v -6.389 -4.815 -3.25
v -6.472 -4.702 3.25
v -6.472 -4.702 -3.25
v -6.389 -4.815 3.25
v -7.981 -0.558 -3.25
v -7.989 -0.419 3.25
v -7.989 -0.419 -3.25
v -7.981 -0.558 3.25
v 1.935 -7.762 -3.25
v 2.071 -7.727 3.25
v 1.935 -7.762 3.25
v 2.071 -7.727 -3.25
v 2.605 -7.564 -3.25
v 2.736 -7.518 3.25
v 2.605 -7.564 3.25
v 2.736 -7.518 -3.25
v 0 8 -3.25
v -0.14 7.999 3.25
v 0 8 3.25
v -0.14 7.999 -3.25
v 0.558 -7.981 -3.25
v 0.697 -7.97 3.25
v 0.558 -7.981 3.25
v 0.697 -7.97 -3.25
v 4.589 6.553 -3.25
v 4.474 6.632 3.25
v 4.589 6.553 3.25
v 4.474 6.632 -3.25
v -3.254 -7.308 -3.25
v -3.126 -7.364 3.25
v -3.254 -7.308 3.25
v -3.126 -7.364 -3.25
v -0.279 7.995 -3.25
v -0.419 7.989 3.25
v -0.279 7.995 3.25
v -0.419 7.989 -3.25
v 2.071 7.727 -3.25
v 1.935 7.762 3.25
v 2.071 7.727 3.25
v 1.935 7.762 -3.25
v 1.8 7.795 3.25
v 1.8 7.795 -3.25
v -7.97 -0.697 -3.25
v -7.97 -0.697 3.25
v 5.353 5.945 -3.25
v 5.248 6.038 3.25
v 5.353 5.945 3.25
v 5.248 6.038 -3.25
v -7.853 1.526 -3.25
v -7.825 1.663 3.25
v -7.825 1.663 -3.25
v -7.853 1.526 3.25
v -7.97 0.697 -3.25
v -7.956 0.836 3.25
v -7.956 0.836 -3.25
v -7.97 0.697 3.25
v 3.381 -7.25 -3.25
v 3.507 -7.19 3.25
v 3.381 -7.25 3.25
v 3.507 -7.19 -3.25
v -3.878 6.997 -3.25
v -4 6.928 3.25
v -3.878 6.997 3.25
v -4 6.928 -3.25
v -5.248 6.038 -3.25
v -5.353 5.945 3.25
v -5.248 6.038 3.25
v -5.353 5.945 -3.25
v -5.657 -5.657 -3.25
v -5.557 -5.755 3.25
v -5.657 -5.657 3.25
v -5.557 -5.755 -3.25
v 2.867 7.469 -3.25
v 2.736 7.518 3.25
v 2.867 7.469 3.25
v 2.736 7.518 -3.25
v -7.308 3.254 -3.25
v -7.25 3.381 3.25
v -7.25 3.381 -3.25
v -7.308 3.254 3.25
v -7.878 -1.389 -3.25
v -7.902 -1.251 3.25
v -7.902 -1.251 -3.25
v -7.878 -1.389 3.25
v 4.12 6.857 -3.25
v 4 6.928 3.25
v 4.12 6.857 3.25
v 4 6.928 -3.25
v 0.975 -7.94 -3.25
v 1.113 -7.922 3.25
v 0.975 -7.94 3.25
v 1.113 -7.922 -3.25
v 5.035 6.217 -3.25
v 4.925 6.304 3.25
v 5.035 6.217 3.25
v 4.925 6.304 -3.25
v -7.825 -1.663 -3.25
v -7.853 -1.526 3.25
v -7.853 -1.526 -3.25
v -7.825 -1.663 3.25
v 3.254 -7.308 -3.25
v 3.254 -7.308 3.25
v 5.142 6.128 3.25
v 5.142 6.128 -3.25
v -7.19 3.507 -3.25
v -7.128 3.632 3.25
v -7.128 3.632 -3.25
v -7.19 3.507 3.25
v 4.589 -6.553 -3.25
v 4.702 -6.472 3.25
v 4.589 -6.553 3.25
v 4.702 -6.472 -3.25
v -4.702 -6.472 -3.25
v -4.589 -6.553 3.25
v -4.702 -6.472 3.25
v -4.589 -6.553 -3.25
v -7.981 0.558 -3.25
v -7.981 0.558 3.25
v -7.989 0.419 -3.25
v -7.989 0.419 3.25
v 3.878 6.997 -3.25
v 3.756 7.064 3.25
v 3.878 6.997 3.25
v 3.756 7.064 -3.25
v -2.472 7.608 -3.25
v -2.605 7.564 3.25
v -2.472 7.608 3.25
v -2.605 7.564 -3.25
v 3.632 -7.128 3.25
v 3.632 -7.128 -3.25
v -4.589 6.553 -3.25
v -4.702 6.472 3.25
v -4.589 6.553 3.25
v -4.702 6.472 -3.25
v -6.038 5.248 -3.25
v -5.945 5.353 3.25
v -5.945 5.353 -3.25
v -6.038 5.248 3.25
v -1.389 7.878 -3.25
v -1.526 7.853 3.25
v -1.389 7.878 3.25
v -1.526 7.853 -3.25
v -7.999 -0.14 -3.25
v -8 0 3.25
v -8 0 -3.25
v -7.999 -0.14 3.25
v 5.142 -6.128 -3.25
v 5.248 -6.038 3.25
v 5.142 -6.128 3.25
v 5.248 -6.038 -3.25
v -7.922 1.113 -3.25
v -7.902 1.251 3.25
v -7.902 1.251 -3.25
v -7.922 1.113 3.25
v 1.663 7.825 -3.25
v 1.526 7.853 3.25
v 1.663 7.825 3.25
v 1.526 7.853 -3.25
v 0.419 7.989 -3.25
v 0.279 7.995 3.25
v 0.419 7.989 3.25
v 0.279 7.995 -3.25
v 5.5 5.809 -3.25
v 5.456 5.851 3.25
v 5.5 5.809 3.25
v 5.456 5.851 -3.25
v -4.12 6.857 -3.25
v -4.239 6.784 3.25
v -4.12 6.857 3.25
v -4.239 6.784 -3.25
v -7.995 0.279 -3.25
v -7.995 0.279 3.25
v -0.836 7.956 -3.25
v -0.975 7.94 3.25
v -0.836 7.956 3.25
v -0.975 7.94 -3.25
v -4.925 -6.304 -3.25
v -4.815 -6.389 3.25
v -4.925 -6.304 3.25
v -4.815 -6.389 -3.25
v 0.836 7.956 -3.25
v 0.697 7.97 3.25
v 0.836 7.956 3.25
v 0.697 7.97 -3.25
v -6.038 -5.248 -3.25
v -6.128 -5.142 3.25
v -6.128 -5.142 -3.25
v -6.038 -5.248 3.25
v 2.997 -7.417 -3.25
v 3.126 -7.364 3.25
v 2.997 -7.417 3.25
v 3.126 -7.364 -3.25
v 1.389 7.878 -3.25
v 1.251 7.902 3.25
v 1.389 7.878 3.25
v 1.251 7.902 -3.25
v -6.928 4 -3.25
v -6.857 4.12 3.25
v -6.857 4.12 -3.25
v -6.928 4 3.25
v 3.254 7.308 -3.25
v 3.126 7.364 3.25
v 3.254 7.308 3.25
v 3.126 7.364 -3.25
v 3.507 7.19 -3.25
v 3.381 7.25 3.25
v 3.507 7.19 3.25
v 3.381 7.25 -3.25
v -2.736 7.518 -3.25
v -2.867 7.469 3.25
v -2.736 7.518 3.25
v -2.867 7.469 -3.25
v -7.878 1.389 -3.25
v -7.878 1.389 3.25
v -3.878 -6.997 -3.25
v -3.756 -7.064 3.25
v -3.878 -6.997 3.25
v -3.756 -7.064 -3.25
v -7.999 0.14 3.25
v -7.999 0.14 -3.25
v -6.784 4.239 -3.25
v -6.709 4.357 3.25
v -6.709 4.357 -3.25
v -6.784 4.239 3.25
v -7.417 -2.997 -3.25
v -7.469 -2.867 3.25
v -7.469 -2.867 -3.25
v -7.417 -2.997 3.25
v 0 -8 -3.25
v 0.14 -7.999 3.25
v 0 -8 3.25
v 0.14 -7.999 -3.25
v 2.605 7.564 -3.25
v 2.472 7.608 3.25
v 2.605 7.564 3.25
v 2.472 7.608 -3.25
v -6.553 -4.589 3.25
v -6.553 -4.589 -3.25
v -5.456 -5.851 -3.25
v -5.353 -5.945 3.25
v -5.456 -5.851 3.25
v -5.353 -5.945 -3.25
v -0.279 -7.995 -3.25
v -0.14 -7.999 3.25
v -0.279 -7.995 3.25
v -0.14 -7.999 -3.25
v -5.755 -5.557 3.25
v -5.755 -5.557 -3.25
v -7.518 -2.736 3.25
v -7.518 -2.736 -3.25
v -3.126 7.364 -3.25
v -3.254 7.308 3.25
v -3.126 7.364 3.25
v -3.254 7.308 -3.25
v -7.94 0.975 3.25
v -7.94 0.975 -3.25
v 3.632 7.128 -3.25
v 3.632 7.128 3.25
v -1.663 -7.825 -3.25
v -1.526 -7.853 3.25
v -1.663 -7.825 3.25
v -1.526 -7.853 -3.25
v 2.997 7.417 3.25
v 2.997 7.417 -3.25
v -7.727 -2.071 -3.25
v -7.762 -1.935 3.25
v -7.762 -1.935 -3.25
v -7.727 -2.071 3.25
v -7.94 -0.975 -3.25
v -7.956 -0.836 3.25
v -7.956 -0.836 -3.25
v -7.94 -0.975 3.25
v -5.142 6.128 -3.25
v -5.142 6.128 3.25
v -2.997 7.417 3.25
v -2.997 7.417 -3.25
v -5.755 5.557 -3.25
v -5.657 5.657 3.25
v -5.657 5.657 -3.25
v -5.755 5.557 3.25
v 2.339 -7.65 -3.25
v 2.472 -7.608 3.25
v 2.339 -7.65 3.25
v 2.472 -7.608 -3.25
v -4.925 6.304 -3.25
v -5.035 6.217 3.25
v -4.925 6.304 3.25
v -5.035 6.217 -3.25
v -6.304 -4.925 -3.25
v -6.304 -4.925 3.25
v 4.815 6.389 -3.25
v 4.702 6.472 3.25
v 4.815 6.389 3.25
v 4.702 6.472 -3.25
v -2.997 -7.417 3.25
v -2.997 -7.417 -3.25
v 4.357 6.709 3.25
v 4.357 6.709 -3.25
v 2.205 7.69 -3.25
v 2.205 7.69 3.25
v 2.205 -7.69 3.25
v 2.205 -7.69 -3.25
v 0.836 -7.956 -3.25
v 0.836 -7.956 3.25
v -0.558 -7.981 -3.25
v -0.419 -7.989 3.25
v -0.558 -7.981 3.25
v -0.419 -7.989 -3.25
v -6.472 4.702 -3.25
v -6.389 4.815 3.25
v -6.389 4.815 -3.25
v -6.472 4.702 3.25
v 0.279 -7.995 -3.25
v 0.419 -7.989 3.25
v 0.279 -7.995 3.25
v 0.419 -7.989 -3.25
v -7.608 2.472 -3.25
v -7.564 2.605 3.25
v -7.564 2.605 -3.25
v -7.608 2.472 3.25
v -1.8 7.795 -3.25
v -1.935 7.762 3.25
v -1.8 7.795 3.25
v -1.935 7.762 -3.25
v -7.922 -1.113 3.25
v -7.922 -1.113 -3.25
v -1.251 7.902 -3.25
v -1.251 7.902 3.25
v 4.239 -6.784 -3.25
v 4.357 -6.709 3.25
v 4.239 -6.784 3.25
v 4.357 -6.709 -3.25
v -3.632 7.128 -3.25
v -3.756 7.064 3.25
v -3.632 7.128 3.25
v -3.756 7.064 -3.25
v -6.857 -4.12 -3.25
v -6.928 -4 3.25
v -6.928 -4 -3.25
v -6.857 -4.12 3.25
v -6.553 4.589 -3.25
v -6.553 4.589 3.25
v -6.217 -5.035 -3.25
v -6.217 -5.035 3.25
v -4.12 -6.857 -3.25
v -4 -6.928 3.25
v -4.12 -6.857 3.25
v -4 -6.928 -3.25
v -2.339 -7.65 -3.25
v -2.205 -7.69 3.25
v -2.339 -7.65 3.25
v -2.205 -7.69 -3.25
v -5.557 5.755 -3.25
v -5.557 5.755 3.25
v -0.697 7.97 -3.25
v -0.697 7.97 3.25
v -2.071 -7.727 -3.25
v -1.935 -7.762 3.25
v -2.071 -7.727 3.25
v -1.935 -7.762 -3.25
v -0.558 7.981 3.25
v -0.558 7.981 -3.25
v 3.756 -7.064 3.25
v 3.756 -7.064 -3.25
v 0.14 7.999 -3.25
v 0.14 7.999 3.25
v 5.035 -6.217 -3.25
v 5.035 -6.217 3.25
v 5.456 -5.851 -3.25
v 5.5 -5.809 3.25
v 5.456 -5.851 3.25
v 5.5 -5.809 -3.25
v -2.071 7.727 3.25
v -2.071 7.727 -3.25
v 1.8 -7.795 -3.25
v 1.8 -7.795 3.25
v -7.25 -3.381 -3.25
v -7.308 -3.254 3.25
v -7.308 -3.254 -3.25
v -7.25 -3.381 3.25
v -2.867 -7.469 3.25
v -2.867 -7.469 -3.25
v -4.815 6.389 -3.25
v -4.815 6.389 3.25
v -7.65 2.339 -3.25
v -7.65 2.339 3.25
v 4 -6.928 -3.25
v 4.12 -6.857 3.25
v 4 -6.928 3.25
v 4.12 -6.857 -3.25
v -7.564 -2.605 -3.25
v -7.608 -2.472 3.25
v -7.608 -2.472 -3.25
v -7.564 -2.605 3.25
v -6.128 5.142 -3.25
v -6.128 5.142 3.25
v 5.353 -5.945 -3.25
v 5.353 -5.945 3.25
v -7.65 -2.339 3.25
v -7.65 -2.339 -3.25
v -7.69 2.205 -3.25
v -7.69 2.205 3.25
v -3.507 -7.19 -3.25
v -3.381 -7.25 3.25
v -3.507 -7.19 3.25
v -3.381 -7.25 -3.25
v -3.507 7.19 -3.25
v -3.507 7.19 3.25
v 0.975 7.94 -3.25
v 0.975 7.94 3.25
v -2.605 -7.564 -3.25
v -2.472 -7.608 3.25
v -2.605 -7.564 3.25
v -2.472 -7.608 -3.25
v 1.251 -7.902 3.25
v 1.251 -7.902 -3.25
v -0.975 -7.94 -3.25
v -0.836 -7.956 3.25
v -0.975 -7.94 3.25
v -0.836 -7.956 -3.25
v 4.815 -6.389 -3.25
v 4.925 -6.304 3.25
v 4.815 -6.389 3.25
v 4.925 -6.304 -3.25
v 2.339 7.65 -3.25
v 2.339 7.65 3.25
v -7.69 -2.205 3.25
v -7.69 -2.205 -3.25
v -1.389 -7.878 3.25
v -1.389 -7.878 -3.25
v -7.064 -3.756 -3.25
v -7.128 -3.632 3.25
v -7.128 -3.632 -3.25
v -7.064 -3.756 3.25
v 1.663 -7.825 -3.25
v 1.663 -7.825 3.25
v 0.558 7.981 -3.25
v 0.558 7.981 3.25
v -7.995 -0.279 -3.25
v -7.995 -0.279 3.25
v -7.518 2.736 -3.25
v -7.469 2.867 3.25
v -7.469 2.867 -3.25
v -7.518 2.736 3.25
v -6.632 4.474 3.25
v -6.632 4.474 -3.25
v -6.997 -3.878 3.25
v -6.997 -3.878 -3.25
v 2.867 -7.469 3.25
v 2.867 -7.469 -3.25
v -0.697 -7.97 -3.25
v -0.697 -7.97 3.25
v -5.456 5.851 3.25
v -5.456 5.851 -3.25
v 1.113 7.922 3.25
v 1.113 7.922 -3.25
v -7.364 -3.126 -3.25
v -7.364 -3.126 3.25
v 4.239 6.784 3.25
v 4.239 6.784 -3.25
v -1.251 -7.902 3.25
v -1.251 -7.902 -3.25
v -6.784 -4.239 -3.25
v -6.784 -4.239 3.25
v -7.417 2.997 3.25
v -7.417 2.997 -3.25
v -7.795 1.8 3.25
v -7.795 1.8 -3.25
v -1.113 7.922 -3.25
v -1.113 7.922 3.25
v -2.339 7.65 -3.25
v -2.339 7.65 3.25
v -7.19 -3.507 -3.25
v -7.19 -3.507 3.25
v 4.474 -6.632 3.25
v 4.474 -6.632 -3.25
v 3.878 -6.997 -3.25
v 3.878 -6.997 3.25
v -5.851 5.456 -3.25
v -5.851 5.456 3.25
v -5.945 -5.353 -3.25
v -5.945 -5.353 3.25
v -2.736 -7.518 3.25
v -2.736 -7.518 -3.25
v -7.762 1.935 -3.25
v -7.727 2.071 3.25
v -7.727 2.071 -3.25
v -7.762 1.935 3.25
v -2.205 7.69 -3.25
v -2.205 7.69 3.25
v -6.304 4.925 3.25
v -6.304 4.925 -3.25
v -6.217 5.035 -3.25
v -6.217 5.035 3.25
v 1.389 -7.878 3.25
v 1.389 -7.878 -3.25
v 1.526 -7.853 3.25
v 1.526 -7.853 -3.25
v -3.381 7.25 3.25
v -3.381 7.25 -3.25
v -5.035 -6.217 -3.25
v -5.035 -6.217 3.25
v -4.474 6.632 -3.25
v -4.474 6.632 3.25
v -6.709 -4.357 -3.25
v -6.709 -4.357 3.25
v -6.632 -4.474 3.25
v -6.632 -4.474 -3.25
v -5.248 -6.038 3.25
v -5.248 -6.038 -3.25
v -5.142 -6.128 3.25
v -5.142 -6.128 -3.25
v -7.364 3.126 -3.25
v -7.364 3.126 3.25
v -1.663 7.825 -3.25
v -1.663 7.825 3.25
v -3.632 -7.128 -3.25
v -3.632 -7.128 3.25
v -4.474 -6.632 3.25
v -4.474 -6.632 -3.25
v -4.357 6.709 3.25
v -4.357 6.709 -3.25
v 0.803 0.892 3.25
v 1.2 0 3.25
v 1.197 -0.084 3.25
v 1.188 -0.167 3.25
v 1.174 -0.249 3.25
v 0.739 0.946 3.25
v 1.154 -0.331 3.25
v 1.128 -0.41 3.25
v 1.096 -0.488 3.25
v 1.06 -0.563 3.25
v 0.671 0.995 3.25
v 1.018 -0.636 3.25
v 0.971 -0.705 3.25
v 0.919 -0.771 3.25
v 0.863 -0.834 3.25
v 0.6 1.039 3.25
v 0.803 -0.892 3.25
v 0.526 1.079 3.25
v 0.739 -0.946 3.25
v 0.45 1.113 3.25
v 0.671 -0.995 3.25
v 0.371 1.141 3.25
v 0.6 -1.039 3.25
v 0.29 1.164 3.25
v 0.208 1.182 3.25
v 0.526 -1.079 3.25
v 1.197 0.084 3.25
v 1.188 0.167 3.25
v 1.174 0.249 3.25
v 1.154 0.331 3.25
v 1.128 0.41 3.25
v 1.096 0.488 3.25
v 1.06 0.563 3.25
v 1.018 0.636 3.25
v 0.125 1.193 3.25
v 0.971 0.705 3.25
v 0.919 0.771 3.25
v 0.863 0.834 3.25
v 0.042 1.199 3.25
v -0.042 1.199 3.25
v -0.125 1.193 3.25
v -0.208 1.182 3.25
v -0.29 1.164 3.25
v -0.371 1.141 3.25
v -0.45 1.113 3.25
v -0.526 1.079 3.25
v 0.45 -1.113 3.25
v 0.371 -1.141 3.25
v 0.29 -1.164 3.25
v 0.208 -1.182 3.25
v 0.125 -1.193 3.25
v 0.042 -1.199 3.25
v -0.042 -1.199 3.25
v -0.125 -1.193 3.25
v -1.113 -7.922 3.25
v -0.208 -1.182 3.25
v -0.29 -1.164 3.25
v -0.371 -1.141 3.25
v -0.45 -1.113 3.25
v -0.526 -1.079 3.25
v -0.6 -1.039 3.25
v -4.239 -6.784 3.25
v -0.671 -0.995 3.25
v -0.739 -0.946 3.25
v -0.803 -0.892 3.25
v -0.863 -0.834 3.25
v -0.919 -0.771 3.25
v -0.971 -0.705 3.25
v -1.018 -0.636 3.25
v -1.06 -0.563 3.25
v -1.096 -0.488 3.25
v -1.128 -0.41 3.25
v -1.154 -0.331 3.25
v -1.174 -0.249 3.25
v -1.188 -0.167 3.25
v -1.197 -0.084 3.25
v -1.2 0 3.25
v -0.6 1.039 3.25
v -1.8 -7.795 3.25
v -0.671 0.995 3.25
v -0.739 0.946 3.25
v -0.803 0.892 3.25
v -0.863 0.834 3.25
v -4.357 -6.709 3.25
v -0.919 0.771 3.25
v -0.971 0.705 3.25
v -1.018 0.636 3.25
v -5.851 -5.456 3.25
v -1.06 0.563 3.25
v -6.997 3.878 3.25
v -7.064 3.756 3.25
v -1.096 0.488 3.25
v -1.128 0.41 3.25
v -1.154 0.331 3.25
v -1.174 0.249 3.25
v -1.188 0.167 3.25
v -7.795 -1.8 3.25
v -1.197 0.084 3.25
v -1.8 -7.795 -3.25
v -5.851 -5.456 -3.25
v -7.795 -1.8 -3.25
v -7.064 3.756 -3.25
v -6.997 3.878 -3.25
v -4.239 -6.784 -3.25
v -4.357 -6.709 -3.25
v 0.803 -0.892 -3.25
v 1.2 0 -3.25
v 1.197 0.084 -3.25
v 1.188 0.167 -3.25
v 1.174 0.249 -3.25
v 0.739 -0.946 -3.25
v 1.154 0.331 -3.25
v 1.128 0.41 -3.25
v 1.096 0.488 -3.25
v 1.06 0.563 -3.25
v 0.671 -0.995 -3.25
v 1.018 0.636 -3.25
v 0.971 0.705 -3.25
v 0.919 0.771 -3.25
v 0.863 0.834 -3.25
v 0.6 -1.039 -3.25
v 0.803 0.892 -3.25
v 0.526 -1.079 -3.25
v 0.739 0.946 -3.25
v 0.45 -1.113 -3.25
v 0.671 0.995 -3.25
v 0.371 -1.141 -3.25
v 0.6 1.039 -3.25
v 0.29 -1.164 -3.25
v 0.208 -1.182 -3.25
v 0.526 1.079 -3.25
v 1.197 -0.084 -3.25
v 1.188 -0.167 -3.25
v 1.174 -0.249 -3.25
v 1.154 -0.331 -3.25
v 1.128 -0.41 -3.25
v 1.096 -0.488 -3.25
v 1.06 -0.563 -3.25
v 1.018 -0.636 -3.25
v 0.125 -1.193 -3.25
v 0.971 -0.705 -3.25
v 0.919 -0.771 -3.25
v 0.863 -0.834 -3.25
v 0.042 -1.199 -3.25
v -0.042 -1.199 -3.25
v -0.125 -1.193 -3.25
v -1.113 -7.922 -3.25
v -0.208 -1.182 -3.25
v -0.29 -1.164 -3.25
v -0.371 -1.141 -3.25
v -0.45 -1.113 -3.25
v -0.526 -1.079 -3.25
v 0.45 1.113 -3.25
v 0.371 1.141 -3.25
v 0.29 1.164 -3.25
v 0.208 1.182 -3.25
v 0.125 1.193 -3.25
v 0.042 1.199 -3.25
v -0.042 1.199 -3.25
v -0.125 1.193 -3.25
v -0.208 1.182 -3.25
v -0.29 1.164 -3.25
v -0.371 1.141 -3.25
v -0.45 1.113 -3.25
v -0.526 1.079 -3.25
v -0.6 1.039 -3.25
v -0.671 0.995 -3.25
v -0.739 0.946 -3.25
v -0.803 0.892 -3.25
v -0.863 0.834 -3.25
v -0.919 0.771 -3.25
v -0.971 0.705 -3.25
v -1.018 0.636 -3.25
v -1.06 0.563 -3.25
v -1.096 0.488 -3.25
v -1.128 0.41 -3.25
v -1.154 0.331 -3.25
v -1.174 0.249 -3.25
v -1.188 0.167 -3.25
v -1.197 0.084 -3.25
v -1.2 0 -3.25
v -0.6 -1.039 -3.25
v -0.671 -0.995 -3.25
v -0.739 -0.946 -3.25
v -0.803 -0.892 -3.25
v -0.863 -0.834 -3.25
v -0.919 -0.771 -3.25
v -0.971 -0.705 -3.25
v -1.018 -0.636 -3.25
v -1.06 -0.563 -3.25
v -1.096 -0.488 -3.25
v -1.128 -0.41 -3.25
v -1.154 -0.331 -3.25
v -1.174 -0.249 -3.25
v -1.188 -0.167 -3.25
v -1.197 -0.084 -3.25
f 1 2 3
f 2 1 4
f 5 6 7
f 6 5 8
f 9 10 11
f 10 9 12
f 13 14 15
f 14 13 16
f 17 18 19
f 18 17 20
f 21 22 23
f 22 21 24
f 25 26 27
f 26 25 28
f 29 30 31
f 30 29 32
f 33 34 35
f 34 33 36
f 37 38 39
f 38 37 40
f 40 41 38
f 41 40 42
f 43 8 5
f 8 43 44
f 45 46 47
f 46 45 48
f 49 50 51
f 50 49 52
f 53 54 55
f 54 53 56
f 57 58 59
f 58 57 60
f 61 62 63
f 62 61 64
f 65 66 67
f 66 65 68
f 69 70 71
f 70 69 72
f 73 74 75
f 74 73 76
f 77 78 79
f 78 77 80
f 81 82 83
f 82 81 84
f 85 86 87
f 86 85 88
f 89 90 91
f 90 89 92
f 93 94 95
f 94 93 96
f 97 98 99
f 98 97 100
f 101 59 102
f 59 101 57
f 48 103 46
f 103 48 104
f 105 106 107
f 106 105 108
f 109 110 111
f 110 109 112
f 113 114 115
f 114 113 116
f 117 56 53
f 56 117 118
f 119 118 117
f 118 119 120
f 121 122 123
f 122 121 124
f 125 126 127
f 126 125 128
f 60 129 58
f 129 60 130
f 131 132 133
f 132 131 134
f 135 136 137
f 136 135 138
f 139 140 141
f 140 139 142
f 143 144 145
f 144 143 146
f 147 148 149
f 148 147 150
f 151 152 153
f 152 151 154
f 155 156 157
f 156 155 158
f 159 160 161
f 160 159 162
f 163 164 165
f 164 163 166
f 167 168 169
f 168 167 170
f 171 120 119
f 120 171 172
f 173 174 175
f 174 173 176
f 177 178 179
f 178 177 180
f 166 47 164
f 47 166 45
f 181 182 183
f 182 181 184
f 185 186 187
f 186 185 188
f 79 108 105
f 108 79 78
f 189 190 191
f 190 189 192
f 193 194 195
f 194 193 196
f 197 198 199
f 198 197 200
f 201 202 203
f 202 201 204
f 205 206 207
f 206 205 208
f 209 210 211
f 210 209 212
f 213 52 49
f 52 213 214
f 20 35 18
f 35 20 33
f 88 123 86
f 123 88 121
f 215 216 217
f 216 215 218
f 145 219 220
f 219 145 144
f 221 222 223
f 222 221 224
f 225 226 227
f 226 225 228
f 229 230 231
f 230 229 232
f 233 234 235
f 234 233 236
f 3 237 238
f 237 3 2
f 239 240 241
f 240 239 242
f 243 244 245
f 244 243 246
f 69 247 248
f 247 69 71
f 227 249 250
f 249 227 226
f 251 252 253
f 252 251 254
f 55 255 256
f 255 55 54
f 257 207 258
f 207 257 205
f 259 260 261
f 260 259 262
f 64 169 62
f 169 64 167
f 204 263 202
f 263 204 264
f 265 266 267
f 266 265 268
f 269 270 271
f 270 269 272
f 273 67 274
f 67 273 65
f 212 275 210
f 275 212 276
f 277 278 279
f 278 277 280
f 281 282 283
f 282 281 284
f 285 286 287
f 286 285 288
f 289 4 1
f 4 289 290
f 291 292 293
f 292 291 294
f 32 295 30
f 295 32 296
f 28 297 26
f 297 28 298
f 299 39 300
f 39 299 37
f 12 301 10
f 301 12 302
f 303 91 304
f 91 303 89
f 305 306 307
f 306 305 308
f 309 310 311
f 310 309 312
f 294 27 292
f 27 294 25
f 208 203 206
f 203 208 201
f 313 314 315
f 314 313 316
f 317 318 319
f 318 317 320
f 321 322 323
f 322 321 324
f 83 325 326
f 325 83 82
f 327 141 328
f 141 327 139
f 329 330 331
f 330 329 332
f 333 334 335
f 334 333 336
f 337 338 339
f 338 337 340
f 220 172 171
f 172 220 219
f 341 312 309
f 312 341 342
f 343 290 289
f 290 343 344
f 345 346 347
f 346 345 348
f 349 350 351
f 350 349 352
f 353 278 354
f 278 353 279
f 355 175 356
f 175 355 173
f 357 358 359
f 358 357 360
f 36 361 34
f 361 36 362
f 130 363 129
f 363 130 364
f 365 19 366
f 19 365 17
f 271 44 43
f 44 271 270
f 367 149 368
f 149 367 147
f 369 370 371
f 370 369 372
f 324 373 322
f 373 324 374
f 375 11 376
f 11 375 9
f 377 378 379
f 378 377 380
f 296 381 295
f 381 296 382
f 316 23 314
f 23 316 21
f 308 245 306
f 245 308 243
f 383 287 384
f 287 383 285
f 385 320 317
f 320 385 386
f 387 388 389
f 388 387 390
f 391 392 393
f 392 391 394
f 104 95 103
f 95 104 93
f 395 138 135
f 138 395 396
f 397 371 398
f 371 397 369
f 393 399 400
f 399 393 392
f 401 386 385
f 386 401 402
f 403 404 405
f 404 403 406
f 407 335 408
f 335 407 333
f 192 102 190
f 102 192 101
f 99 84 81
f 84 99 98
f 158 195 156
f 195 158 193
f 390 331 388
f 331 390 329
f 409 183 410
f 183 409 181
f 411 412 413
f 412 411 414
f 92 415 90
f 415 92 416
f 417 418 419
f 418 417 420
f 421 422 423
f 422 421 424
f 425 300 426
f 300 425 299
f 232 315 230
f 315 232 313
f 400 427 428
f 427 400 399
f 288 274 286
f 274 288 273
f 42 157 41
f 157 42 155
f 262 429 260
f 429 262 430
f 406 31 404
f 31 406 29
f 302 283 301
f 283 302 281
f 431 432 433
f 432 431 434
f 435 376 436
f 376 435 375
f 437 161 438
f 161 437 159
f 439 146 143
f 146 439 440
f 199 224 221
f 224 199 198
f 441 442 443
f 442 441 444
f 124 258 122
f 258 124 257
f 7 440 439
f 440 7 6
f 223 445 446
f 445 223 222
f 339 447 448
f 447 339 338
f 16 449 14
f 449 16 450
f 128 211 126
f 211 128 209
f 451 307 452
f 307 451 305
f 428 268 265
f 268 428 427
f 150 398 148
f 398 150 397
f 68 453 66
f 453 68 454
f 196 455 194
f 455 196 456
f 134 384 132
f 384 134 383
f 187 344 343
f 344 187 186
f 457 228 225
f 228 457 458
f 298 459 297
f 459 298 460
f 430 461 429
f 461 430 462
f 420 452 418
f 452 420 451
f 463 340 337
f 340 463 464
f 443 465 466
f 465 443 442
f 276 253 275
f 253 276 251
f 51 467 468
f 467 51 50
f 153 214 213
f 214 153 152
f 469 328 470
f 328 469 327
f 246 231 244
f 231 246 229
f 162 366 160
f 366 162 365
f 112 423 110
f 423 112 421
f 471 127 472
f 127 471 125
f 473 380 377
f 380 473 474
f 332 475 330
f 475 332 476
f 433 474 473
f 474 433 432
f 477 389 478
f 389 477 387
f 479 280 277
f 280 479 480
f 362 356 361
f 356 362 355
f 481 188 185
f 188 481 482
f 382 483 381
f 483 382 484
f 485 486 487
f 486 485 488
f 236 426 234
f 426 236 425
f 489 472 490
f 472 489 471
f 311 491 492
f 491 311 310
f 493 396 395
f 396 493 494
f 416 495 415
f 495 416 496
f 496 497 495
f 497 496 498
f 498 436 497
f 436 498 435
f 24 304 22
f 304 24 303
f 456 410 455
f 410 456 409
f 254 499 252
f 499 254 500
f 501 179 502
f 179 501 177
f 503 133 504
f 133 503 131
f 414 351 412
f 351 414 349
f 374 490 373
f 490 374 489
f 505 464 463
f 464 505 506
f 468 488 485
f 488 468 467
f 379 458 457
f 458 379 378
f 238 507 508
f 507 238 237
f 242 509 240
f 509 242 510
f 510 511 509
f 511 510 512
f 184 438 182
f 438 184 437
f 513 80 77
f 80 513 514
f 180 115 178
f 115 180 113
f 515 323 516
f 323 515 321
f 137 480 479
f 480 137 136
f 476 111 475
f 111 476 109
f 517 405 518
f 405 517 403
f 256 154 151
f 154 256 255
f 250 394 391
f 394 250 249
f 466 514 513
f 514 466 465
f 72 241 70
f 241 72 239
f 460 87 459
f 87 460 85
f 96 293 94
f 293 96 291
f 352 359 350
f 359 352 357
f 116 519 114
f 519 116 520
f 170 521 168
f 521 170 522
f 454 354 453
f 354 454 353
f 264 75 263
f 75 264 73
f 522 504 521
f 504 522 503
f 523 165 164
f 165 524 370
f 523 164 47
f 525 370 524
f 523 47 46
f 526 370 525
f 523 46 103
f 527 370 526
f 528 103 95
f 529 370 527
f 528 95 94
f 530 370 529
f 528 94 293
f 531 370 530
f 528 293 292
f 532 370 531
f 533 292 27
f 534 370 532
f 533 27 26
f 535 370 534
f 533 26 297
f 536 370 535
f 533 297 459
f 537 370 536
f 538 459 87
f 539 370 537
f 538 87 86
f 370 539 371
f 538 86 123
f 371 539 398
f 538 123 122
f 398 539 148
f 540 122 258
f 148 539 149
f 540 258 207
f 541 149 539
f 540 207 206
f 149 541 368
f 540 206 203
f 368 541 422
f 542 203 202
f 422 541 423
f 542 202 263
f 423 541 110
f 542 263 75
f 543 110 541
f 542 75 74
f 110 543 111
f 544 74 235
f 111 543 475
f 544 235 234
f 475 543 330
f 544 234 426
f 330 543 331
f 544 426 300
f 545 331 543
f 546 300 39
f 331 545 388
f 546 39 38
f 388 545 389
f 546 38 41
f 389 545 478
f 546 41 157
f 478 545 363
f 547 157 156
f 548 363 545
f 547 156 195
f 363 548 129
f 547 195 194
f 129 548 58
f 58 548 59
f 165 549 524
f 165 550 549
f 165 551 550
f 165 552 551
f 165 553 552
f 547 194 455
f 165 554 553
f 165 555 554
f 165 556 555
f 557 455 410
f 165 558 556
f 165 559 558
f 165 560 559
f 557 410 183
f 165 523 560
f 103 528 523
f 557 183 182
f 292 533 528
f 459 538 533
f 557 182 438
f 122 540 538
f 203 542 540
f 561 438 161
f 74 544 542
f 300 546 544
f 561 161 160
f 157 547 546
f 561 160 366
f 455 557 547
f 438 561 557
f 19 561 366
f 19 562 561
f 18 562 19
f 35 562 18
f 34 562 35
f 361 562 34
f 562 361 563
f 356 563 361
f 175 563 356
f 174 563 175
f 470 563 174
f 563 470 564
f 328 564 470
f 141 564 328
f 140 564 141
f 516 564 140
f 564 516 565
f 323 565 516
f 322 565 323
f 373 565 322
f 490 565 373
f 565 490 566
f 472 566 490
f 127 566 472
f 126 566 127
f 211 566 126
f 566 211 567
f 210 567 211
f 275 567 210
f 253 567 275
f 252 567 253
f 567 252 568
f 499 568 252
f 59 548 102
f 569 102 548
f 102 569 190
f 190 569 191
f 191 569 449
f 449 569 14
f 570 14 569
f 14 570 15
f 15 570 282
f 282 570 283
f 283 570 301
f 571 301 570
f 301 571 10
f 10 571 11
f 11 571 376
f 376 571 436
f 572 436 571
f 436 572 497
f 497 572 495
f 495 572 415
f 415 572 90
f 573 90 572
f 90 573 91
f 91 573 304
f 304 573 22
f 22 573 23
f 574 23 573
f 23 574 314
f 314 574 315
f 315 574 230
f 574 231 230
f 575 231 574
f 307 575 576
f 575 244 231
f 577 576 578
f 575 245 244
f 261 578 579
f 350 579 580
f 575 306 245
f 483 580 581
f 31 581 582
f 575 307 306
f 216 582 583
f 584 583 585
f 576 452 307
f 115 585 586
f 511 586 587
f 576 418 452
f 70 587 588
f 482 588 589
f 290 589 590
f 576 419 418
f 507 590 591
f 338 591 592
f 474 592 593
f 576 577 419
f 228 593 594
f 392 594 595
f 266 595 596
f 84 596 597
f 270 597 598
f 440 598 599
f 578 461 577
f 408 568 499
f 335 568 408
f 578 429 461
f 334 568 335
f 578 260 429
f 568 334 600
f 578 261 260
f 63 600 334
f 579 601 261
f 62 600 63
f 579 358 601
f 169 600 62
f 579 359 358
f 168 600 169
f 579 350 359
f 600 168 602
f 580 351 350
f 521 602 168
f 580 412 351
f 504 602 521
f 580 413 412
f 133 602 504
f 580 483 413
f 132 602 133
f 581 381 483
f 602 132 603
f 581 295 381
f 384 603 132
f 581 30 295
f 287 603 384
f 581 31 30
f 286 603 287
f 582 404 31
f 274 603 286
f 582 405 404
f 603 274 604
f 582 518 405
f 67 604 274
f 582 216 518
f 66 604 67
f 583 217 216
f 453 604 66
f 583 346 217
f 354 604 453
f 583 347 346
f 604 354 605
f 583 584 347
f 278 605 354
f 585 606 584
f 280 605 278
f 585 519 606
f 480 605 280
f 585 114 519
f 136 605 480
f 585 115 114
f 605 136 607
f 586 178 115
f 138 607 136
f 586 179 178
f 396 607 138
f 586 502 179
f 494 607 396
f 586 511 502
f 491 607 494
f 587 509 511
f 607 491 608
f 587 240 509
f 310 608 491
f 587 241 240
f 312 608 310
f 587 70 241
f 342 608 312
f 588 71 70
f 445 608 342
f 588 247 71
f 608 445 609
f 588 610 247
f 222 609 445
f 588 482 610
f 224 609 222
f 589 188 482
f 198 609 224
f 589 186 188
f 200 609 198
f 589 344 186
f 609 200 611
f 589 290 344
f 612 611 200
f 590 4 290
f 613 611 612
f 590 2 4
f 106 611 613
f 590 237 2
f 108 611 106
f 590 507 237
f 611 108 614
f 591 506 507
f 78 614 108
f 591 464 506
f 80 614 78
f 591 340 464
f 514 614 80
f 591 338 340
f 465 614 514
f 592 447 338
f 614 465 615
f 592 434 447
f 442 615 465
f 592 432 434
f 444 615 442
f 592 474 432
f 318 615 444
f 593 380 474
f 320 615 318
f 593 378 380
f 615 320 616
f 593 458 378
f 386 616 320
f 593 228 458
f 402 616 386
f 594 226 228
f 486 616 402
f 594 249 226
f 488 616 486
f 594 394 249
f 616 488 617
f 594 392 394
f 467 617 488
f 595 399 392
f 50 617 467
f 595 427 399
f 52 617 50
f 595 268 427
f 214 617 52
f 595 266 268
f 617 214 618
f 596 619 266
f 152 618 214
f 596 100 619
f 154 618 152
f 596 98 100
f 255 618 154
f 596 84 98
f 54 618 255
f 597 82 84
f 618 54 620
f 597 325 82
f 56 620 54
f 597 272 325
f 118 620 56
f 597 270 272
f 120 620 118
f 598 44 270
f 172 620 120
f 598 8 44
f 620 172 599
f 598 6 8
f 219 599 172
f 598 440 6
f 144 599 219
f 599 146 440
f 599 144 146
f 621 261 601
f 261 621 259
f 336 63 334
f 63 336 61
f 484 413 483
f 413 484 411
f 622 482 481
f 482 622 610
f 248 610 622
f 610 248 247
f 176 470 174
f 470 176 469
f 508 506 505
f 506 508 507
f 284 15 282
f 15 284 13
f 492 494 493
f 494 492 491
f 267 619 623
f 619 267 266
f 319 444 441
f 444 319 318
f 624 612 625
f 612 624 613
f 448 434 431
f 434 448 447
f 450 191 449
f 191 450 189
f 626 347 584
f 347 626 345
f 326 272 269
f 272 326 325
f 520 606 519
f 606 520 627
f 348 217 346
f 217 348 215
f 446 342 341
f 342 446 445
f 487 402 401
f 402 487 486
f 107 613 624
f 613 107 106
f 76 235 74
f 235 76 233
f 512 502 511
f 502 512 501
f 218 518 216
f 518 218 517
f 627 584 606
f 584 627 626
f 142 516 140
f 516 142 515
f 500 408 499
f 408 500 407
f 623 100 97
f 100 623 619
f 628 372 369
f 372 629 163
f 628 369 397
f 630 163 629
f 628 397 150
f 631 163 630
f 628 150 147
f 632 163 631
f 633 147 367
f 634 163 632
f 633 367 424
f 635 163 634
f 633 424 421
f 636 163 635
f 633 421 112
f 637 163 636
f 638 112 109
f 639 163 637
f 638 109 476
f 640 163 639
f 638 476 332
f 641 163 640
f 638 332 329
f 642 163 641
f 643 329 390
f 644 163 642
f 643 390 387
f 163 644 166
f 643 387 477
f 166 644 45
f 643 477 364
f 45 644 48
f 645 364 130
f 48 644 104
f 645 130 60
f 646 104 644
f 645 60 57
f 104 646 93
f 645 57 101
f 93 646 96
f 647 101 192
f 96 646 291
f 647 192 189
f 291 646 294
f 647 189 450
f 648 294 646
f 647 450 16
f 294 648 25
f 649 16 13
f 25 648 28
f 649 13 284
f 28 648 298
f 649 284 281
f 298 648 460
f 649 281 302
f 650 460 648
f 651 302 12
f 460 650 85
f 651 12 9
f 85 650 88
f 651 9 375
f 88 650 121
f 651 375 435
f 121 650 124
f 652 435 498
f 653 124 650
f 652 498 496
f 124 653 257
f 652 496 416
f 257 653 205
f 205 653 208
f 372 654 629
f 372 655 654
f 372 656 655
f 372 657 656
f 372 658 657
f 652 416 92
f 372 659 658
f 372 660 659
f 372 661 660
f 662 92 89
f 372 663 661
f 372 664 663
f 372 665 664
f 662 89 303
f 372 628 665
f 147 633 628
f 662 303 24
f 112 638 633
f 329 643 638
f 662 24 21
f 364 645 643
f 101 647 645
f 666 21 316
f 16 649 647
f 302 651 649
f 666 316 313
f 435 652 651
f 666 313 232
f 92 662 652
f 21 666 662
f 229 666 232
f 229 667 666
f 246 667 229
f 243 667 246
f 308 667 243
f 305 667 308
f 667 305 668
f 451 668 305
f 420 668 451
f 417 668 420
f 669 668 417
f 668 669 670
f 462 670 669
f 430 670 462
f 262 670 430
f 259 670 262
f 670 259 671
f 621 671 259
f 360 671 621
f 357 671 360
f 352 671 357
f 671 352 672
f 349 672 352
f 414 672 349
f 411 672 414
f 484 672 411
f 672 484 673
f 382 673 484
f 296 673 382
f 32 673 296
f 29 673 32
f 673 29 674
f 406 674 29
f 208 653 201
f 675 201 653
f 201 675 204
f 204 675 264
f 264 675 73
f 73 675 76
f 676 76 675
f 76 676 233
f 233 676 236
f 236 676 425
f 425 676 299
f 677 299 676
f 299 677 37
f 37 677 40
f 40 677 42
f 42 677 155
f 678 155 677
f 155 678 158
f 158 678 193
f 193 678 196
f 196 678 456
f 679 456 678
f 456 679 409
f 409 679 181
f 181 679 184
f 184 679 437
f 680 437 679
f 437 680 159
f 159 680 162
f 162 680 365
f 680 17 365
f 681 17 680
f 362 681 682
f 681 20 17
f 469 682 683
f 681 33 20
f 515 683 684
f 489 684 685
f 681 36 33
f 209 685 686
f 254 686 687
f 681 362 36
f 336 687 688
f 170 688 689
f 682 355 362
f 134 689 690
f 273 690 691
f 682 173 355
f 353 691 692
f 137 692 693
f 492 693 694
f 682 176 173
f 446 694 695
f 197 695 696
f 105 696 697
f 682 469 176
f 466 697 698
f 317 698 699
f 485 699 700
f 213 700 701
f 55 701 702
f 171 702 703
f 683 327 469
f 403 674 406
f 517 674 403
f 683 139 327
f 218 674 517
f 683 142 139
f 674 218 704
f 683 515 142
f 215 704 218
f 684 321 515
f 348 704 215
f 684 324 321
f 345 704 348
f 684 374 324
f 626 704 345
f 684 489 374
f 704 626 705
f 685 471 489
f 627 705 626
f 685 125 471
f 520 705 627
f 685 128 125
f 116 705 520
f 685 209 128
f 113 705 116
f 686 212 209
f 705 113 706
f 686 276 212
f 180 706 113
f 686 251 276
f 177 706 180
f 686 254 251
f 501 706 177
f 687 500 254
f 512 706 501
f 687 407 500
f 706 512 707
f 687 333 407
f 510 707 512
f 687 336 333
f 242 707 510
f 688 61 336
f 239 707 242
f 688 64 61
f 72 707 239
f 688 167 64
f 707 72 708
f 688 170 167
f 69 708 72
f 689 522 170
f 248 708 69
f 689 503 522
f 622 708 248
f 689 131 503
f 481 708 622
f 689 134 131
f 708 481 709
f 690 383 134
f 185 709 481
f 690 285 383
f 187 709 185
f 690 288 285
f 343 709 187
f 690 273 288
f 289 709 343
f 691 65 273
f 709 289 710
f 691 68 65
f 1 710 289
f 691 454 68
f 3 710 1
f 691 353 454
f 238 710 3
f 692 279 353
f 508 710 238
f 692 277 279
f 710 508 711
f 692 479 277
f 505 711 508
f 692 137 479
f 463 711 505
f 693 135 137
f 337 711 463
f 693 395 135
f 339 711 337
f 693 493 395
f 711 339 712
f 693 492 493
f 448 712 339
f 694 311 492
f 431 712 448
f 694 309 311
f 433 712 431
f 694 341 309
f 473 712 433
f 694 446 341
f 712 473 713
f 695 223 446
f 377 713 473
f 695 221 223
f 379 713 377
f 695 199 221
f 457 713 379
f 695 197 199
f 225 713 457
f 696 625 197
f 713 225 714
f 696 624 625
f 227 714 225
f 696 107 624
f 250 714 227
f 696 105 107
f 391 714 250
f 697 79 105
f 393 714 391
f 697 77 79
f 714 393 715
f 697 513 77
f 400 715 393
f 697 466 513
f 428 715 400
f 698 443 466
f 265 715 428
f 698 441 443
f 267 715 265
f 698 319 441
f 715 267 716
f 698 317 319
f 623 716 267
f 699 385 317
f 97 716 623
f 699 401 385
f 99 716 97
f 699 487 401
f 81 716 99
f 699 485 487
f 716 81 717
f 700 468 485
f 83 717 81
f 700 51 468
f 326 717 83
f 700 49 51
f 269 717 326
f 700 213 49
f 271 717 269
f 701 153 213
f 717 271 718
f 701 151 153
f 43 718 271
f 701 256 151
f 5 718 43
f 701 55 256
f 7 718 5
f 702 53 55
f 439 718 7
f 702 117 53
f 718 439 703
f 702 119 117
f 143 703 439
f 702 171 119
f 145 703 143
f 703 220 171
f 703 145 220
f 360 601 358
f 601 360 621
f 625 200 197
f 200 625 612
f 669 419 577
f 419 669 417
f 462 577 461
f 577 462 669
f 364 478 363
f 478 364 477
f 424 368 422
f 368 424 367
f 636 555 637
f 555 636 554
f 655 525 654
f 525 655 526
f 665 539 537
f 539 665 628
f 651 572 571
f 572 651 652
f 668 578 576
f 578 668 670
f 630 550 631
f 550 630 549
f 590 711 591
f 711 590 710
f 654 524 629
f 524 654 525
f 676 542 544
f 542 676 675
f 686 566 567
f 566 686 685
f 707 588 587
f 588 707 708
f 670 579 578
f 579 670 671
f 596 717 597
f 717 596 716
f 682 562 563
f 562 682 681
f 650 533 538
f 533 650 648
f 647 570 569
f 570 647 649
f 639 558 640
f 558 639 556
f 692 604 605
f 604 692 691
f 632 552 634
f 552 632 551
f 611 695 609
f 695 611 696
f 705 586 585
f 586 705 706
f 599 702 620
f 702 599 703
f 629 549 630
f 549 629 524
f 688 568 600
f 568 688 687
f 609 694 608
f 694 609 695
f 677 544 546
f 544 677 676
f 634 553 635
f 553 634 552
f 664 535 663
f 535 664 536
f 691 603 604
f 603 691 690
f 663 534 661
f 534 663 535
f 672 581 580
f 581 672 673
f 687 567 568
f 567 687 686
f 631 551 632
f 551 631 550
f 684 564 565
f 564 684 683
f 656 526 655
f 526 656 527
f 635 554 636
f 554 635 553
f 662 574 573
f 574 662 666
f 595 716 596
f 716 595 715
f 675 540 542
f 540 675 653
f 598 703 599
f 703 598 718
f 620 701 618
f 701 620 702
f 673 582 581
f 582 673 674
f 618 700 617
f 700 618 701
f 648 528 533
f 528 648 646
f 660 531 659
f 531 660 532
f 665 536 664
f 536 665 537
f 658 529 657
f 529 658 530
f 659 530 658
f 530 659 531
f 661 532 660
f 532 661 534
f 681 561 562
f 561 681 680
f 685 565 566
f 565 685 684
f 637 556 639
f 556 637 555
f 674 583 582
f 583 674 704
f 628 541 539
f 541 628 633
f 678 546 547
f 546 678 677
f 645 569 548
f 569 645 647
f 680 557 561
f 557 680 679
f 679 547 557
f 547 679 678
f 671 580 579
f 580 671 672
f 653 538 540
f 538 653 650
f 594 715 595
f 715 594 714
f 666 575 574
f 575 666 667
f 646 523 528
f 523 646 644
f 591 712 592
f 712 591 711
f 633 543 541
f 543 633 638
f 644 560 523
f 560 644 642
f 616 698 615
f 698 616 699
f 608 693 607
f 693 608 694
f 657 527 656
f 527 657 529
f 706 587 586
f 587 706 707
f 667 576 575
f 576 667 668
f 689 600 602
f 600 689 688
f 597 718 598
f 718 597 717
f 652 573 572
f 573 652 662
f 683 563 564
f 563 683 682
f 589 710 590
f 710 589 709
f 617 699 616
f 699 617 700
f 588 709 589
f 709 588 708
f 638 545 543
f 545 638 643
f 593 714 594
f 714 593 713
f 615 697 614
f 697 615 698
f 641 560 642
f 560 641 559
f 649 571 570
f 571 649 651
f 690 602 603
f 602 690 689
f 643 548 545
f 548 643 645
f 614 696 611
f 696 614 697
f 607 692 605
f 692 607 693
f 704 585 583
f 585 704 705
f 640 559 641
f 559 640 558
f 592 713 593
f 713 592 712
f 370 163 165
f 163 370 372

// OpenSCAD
radius=16/2;
nailradius=1;
nailcentertoflat=5.5;
depth=6.5;

difference() {
    cylinder(h=depth,r=radius,center=true, $fn=360);
    cylinder(h=depth+2,r=nailradius+0.2,center=true, $fn=90);
    translate([nailcentertoflat, -radius, -depth+1])
	cube(size=radius*2,center=false);
}
